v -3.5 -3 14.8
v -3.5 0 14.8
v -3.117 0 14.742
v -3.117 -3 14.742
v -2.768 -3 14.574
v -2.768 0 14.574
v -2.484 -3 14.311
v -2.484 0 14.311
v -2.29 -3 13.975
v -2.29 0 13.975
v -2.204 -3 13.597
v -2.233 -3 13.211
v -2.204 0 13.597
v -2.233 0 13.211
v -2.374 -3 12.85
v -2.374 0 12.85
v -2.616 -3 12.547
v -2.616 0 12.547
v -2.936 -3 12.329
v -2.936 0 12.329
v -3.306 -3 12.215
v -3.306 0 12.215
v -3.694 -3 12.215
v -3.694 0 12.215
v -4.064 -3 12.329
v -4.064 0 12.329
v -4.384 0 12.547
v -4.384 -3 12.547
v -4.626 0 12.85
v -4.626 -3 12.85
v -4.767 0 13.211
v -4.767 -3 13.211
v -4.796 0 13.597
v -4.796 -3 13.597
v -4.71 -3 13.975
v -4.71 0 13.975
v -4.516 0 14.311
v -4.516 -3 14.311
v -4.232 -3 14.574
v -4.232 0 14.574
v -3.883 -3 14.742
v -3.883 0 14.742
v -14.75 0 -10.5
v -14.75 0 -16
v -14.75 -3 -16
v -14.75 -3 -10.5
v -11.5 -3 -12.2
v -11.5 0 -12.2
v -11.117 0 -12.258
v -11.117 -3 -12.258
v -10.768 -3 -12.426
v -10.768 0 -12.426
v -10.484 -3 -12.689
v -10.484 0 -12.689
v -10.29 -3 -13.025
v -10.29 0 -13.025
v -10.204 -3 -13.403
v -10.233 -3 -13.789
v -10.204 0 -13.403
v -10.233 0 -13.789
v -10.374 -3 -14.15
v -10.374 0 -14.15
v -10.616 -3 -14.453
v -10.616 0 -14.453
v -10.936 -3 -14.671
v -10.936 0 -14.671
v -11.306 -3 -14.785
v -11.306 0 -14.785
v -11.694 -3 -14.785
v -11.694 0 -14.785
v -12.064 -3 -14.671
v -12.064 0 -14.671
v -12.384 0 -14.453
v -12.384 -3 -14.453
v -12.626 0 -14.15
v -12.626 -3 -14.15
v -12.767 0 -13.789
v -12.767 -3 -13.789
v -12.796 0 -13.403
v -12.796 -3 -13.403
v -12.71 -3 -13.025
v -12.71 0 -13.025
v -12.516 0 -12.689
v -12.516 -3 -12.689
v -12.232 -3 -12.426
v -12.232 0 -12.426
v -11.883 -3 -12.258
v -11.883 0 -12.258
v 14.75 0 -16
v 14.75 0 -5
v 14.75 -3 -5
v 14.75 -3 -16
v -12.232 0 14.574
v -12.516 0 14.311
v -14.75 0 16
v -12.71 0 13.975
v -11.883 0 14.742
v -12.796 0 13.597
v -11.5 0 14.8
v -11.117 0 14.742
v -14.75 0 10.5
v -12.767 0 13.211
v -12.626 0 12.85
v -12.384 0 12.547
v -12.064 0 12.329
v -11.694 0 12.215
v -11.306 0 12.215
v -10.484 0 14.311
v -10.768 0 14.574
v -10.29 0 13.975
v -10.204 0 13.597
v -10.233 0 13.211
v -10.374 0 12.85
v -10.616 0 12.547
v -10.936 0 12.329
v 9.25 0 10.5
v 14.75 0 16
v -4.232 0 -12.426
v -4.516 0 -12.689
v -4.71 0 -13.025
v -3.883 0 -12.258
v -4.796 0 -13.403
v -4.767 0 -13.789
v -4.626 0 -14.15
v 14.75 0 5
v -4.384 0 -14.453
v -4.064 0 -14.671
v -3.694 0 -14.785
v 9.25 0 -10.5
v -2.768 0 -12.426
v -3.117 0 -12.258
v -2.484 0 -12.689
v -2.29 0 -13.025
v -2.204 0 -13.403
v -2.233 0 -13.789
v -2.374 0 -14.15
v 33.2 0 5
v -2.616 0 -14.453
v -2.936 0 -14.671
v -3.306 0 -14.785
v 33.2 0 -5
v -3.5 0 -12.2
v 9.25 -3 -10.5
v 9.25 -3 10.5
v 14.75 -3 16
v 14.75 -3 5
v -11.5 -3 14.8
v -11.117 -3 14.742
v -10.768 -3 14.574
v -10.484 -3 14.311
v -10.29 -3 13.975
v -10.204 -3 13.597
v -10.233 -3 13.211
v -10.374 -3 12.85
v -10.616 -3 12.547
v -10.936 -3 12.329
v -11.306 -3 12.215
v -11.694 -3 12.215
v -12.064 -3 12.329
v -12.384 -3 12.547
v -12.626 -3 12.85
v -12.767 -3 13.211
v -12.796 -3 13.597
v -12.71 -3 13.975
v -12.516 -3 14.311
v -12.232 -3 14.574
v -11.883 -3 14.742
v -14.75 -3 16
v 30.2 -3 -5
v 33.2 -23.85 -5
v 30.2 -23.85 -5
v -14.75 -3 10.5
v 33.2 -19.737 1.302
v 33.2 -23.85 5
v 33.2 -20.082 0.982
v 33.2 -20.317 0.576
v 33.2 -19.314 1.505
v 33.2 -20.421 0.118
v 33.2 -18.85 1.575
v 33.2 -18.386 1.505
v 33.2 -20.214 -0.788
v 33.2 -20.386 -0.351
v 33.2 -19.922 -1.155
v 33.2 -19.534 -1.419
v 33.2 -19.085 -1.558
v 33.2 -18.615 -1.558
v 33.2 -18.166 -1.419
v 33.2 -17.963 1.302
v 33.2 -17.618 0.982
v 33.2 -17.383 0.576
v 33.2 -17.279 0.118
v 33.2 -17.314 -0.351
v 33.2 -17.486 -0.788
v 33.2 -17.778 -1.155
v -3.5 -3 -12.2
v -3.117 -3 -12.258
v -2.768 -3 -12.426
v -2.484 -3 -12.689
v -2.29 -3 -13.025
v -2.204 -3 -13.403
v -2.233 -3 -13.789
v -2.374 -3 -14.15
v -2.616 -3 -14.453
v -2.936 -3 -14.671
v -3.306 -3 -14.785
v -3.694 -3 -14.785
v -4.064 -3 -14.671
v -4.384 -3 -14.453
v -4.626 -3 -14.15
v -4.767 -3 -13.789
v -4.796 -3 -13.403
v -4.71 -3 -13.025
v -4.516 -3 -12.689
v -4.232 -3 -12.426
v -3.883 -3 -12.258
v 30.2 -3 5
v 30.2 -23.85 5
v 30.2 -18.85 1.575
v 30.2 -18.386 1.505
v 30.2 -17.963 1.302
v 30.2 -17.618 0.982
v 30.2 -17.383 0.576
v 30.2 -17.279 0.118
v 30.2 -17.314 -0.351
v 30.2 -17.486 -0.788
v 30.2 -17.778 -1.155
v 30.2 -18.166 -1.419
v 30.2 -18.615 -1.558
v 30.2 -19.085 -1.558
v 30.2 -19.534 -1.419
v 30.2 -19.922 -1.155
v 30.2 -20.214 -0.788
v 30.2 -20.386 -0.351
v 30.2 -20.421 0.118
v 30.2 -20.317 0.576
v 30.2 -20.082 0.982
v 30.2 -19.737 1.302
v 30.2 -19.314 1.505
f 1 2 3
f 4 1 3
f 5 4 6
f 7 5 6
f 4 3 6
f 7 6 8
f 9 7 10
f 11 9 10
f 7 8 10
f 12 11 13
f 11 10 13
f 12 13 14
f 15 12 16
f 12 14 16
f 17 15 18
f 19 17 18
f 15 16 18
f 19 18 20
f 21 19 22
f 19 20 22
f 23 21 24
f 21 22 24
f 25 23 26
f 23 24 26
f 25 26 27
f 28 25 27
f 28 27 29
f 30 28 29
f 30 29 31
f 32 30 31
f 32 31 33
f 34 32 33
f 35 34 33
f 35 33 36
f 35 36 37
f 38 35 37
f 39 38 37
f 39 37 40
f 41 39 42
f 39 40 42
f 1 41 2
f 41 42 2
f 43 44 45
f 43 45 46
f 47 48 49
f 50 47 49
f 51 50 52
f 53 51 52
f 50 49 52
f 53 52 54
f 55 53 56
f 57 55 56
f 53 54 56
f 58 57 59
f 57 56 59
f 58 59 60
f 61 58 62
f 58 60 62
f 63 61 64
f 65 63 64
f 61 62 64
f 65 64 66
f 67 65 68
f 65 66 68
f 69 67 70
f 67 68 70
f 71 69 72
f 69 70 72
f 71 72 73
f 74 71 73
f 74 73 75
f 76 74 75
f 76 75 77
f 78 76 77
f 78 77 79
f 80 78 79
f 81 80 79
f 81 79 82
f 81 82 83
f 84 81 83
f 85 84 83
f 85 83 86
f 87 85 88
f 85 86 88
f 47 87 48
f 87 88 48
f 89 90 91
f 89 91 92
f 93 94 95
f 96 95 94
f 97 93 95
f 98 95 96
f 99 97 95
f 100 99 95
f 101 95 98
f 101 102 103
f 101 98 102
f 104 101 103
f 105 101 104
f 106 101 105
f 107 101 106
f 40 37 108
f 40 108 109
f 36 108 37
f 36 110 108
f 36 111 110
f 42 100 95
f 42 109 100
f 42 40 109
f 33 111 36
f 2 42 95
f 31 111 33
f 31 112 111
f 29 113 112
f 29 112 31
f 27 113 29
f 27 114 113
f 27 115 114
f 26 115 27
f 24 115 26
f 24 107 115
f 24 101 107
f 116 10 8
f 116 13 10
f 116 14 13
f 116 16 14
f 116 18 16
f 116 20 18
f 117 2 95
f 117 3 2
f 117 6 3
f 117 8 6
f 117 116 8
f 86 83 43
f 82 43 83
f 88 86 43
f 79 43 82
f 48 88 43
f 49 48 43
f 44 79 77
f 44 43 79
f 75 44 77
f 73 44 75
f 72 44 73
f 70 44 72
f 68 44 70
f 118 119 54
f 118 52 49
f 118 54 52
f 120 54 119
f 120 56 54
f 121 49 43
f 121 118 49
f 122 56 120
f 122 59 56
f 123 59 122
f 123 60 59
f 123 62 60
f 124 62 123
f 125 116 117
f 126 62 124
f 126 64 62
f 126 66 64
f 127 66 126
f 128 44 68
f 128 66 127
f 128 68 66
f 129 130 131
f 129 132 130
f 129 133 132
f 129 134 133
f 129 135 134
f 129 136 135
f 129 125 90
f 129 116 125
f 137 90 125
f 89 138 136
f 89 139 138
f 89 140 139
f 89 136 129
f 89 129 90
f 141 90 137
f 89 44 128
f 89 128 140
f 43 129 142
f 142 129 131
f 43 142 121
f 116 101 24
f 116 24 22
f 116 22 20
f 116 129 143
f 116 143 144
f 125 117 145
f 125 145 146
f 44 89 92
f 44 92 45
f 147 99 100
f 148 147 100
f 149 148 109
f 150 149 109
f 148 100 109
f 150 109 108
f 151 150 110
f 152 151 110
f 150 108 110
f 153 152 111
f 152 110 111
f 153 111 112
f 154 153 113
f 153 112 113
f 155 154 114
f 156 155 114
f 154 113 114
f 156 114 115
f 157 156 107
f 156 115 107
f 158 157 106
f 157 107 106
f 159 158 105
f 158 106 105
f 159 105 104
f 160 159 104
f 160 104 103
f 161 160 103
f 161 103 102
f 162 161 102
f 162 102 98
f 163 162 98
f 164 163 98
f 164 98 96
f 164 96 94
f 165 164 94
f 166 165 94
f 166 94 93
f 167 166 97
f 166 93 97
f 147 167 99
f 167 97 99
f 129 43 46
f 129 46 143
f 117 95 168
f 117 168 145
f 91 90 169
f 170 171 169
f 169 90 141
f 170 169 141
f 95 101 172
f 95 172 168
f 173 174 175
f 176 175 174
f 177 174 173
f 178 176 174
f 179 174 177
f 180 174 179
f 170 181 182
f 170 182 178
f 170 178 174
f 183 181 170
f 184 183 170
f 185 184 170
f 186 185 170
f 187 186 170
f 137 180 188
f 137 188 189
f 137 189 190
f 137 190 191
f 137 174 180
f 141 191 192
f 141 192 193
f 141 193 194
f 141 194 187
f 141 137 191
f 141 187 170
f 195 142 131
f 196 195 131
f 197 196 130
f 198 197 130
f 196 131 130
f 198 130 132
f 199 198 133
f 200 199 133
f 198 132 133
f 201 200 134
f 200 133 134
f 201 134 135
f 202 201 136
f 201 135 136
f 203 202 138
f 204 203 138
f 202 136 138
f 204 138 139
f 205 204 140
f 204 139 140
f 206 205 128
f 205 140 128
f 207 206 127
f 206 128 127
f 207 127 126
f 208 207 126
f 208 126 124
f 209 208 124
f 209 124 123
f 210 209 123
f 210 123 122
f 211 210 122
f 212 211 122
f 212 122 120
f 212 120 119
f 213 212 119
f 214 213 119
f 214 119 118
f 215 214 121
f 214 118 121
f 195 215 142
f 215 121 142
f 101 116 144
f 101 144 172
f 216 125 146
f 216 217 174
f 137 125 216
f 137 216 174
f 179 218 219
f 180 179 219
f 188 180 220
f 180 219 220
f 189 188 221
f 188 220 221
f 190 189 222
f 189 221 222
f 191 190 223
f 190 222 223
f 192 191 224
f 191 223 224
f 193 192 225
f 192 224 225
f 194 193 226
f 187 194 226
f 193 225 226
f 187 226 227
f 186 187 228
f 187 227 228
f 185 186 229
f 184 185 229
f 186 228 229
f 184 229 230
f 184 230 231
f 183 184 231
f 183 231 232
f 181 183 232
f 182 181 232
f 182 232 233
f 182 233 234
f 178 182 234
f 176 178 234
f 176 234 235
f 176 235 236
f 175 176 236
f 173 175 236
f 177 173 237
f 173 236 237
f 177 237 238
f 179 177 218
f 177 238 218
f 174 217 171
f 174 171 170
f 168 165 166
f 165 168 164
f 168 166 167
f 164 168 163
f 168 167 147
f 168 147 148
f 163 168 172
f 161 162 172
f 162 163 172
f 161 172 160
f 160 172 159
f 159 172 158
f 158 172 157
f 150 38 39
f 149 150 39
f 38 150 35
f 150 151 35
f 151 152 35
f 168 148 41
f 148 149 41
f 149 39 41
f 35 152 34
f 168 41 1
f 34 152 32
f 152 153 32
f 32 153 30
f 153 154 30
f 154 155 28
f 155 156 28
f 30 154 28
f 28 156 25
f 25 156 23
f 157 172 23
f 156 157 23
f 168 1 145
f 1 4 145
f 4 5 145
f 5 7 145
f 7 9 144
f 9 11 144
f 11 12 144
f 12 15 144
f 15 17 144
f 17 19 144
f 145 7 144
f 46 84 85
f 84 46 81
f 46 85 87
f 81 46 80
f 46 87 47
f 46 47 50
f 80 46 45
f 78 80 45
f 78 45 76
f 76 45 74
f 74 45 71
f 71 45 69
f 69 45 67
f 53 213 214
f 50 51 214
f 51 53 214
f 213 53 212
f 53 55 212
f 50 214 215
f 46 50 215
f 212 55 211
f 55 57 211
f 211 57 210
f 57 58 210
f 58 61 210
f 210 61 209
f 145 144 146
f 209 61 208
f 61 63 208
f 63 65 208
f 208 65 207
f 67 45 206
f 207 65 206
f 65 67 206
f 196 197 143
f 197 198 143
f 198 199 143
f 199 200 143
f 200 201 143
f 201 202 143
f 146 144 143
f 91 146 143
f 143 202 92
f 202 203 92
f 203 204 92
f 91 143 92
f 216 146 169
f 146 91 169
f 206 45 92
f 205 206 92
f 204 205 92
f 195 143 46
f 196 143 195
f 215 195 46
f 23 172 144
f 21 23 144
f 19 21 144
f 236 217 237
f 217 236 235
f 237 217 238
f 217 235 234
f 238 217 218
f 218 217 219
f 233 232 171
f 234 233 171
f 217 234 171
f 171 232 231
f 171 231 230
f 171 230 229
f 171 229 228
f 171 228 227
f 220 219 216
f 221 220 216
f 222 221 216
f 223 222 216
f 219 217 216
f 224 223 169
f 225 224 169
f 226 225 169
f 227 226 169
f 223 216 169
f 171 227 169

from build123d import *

# Parameters (mm, degrees)
SKETCH1_R           = 1.3
SKETCH1_W           = 3
SKETCH1_H           = 10
BOSS_EXTRUDE2_DEPTH = 3
SKETCH1_5_W         = 3
SKETCH1_5_H         = 10
BOSS_EXTRUDE3_DEPTH = 23.85
SKETCH4_R           = 1.575411087
CUT_EXTRUDE1_DEPTH  = 3


with BuildPart() as part:
    # Sketch1 → Boss-Extrude2 (new body)
    # profile 1 of 2: a face of its own
    with BuildSketch(Plane(origin=(0, 0, 0), x_dir=(1, 0, 0), z_dir=(0, 1, 0))):
        Polygon((-14.75, 16), (-14.75, 10.5), (9.25, 10.5), (9.25, -10.5), (-14.75, -10.5), (-14.75, -16), (14.75, -16), (14.75, -5), (30.2, -5), (30.2, 5), (14.75, 5), (14.75, 16), align=None)
        with Locations(Location((-11.5, -13.5, 0), (0, 0, 270))):
            Circle(SKETCH1_R, mode=Mode.SUBTRACT)
        with Locations(Location((-3.5, -13.5, 0), (0, 0, 270))):
            Circle(SKETCH1_R, mode=Mode.SUBTRACT)
        with Locations(Location((-11.5, 13.5, 0), (0, 0, 270))):
            Circle(SKETCH1_R, mode=Mode.SUBTRACT)
        with Locations(Location((-3.5, 13.5, 0), (0, 0, 270))):
            Circle(SKETCH1_R, mode=Mode.SUBTRACT)
    # profile 2 of 2: a face of its own
    with BuildSketch(Plane(origin=(0, 0, 0), x_dir=(1, 0, 0), z_dir=(0, 1, 0))):
        with Locations((31.7, 0)):
            Rectangle(SKETCH1_W, SKETCH1_H)
    extrude(amount=-BOSS_EXTRUDE2_DEPTH)

    # Sketch1<5> → Boss-Extrude3 (add)
    with BuildSketch(Plane(origin=(0, 0, 0), x_dir=(1, 0, 0), z_dir=(0, 1, 0))):
        with Locations((31.7, 0)):
            Rectangle(SKETCH1_5_W, SKETCH1_5_H)
    extrude(amount=-BOSS_EXTRUDE3_DEPTH)

    # Sketch4 → Cut-Extrude1 (cut)
    with BuildSketch(Plane.ZY.offset(-30.2)):
        with Locations((0, -18.85)):
            Circle(SKETCH4_R)
    extrude(amount=-CUT_EXTRUDE1_DEPTH, mode=Mode.SUBTRACT)


solid = part.part
